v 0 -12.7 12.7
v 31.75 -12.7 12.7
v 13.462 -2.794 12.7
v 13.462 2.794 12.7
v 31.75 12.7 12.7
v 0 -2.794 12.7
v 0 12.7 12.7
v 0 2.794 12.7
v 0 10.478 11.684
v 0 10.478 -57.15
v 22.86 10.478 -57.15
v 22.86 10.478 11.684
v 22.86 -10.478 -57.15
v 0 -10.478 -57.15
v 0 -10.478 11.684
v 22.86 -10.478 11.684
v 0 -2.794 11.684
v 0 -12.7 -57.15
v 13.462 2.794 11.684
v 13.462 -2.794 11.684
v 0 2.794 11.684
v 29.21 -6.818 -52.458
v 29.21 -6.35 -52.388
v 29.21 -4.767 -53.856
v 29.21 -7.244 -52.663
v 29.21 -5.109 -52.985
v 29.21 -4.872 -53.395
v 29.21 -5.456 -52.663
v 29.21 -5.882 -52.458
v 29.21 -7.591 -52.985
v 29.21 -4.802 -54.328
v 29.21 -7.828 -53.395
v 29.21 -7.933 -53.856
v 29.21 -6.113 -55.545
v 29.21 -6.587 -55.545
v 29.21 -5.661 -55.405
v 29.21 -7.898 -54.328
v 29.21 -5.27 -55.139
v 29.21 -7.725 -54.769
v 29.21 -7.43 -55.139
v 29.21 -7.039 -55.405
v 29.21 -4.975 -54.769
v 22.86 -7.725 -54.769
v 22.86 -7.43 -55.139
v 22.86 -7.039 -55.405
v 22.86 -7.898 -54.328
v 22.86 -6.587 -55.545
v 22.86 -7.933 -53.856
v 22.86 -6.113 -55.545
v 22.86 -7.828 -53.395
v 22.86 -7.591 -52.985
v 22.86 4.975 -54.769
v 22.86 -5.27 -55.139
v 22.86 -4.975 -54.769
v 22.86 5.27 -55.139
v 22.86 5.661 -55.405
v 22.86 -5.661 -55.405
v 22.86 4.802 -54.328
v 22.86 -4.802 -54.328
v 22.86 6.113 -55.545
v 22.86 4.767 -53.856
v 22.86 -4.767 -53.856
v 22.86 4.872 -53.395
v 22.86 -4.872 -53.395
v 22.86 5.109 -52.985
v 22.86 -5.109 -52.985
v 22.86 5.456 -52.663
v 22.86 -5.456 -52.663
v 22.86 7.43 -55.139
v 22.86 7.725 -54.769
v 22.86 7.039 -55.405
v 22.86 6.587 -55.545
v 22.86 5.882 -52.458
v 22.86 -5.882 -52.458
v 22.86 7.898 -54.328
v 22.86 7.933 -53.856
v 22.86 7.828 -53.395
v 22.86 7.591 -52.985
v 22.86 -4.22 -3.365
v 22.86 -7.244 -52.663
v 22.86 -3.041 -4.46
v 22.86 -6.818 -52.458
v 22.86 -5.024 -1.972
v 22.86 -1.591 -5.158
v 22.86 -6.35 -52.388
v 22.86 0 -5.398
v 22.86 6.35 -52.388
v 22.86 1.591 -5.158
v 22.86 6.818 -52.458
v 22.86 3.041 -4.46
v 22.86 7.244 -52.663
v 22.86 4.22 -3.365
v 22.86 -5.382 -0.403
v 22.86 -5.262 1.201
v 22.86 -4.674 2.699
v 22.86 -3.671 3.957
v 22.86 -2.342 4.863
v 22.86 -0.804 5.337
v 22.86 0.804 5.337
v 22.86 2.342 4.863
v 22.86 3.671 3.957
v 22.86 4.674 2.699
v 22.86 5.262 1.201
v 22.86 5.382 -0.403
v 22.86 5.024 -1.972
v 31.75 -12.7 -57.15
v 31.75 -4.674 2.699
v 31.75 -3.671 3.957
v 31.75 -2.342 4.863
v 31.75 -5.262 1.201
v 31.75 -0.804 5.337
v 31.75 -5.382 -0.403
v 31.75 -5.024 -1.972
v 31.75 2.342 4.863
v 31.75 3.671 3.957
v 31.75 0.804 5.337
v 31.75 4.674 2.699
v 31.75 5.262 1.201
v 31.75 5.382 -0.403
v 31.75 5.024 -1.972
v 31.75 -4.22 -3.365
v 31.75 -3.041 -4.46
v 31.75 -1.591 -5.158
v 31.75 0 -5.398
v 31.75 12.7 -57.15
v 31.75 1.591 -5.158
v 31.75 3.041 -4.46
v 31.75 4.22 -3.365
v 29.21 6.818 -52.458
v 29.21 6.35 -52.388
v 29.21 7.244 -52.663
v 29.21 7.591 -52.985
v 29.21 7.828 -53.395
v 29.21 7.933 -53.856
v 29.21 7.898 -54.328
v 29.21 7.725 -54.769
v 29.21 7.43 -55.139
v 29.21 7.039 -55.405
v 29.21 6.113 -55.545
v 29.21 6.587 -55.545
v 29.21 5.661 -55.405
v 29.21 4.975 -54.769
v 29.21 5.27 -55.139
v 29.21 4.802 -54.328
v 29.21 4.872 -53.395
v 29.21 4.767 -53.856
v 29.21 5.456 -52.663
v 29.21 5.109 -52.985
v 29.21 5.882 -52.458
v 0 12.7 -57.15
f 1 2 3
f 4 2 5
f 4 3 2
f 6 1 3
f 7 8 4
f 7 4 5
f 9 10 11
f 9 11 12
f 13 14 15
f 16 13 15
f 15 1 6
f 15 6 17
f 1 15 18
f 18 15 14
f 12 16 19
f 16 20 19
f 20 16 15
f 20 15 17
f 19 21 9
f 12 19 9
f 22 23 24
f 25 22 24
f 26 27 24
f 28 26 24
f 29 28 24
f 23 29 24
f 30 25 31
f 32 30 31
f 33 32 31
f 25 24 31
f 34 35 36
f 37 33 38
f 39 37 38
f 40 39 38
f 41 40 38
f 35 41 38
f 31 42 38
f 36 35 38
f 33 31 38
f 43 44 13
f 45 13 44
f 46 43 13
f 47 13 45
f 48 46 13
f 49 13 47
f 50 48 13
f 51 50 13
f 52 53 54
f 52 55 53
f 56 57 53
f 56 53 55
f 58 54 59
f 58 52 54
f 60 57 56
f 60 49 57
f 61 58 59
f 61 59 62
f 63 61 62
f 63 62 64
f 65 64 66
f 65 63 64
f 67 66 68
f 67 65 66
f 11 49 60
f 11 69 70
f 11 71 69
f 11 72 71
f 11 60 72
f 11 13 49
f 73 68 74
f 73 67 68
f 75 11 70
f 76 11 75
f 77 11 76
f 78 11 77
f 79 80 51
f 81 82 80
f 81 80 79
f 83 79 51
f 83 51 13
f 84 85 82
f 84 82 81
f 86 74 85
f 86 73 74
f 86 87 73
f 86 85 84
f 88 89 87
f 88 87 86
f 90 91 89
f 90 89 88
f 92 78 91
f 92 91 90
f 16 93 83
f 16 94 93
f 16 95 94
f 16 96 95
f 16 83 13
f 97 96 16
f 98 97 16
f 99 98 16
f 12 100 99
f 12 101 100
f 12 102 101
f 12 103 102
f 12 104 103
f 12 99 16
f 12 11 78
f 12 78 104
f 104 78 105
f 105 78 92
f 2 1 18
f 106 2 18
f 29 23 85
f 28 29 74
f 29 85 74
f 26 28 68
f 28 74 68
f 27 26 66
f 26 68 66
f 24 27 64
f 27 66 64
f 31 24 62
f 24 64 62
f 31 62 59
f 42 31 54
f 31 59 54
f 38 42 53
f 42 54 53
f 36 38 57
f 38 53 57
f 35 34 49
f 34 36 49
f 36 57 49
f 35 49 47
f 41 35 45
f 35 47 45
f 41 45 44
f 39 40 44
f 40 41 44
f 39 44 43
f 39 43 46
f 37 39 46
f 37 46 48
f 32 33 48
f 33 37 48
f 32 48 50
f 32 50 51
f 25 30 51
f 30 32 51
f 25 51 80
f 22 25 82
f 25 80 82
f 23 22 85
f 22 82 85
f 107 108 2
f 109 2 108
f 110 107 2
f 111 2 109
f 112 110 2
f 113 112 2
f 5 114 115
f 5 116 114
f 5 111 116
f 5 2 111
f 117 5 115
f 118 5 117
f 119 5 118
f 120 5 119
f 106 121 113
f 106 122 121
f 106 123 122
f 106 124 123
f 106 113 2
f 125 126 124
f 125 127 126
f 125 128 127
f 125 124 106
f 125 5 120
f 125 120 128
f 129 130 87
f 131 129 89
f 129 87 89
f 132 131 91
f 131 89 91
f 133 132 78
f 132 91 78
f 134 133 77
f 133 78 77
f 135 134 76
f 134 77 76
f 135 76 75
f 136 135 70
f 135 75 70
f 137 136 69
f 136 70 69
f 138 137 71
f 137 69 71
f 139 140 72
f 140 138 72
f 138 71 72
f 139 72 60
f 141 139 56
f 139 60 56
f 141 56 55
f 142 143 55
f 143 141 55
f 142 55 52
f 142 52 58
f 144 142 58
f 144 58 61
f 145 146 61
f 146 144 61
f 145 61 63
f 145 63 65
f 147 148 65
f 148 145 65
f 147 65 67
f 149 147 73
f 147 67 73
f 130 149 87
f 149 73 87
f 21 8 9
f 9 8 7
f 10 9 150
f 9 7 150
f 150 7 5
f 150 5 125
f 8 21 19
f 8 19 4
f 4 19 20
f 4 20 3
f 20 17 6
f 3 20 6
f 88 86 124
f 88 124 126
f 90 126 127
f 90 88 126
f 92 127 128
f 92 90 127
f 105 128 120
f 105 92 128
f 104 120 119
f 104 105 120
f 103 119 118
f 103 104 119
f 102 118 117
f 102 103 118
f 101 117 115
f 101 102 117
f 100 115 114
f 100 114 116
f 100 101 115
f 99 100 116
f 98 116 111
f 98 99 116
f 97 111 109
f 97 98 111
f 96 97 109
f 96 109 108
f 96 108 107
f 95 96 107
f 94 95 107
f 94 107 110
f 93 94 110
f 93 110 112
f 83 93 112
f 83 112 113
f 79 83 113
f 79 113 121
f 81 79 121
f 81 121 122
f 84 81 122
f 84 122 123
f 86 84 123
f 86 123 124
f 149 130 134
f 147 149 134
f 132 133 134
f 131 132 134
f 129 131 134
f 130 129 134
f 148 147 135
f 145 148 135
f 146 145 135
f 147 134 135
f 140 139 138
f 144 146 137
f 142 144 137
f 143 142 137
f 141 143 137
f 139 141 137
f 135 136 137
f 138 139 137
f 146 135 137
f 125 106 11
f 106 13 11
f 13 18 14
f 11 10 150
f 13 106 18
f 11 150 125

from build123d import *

# Parameters (mm, degrees)
SKETCH1_W           = 69.85
SKETCH1_H           = 25.4
SKETCH1_R           = 5.3975
BOSS_EXTRUDE1_DEPTH = 31.75
SKETCH2_W           = 71.374
SKETCH2_H           = 20.955
CUT_EXTRUDE1_DEPTH  = 22.86
SKETCH2_3_W         = 5.08
SKETCH2_3_H         = 5.588
CUT_EXTRUDE2_DEPTH  = 13.462
SKETCH3_R           = 1.5875
CUT_EXTRUDE3_DEPTH  = 63.848962601
BOSS_EXTRUDE2_START = -2.54
SKETCH8_R           = 1.5875
BOSS_EXTRUDE2_DEPTH = 2.54


with BuildPart() as part:
    # Sketch1 → Boss-Extrude1 (new body)
    with BuildSketch(Plane(origin=(0, 0, 0), x_dir=(0, 0, -1), z_dir=(1, 0, 0))):
        with Locations((22.225, 0)):
            Rectangle(SKETCH1_W, SKETCH1_H)
        Circle(SKETCH1_R, mode=Mode.SUBTRACT)
    extrude(amount=BOSS_EXTRUDE1_DEPTH)

    # Sketch2 → Cut-Extrude1 (cut)
    with BuildSketch(Plane.ZY):
        with Locations((-24.003, 0)):
            Rectangle(SKETCH2_W, SKETCH2_H)
    extrude(amount=-CUT_EXTRUDE1_DEPTH, mode=Mode.SUBTRACT)

    # Sketch2<3> → Cut-Extrude2 (cut)
    with BuildSketch(Plane.ZY):
        with Locations((14.224, 0)):
            Rectangle(SKETCH2_3_W, SKETCH2_3_H)
    extrude(amount=-CUT_EXTRUDE2_DEPTH, mode=Mode.SUBTRACT)

    # Sketch3 → Cut-Extrude3 (cut, through all)
    with BuildSketch(Plane.ZY.offset(-22.86)):
        with Locations((-53.975, 6.35)):
            Circle(SKETCH3_R)
        with Locations((-53.975, -6.35)):
            Circle(SKETCH3_R)
    extrude(amount=-CUT_EXTRUDE3_DEPTH, mode=Mode.SUBTRACT)

    # Sketch8 → Boss-Extrude2 (add)
    with BuildSketch(Plane(origin=(31.75, 0, 0), x_dir=(0, 0, -1), z_dir=(1, 0, 0)).offset(BOSS_EXTRUDE2_START)):
        with Locations((53.975, -6.35)):
            Circle(SKETCH8_R)
        with Locations((53.975, 6.35)):
            Circle(SKETCH8_R)
    extrude(amount=BOSS_EXTRUDE2_DEPTH)


solid = part.part
